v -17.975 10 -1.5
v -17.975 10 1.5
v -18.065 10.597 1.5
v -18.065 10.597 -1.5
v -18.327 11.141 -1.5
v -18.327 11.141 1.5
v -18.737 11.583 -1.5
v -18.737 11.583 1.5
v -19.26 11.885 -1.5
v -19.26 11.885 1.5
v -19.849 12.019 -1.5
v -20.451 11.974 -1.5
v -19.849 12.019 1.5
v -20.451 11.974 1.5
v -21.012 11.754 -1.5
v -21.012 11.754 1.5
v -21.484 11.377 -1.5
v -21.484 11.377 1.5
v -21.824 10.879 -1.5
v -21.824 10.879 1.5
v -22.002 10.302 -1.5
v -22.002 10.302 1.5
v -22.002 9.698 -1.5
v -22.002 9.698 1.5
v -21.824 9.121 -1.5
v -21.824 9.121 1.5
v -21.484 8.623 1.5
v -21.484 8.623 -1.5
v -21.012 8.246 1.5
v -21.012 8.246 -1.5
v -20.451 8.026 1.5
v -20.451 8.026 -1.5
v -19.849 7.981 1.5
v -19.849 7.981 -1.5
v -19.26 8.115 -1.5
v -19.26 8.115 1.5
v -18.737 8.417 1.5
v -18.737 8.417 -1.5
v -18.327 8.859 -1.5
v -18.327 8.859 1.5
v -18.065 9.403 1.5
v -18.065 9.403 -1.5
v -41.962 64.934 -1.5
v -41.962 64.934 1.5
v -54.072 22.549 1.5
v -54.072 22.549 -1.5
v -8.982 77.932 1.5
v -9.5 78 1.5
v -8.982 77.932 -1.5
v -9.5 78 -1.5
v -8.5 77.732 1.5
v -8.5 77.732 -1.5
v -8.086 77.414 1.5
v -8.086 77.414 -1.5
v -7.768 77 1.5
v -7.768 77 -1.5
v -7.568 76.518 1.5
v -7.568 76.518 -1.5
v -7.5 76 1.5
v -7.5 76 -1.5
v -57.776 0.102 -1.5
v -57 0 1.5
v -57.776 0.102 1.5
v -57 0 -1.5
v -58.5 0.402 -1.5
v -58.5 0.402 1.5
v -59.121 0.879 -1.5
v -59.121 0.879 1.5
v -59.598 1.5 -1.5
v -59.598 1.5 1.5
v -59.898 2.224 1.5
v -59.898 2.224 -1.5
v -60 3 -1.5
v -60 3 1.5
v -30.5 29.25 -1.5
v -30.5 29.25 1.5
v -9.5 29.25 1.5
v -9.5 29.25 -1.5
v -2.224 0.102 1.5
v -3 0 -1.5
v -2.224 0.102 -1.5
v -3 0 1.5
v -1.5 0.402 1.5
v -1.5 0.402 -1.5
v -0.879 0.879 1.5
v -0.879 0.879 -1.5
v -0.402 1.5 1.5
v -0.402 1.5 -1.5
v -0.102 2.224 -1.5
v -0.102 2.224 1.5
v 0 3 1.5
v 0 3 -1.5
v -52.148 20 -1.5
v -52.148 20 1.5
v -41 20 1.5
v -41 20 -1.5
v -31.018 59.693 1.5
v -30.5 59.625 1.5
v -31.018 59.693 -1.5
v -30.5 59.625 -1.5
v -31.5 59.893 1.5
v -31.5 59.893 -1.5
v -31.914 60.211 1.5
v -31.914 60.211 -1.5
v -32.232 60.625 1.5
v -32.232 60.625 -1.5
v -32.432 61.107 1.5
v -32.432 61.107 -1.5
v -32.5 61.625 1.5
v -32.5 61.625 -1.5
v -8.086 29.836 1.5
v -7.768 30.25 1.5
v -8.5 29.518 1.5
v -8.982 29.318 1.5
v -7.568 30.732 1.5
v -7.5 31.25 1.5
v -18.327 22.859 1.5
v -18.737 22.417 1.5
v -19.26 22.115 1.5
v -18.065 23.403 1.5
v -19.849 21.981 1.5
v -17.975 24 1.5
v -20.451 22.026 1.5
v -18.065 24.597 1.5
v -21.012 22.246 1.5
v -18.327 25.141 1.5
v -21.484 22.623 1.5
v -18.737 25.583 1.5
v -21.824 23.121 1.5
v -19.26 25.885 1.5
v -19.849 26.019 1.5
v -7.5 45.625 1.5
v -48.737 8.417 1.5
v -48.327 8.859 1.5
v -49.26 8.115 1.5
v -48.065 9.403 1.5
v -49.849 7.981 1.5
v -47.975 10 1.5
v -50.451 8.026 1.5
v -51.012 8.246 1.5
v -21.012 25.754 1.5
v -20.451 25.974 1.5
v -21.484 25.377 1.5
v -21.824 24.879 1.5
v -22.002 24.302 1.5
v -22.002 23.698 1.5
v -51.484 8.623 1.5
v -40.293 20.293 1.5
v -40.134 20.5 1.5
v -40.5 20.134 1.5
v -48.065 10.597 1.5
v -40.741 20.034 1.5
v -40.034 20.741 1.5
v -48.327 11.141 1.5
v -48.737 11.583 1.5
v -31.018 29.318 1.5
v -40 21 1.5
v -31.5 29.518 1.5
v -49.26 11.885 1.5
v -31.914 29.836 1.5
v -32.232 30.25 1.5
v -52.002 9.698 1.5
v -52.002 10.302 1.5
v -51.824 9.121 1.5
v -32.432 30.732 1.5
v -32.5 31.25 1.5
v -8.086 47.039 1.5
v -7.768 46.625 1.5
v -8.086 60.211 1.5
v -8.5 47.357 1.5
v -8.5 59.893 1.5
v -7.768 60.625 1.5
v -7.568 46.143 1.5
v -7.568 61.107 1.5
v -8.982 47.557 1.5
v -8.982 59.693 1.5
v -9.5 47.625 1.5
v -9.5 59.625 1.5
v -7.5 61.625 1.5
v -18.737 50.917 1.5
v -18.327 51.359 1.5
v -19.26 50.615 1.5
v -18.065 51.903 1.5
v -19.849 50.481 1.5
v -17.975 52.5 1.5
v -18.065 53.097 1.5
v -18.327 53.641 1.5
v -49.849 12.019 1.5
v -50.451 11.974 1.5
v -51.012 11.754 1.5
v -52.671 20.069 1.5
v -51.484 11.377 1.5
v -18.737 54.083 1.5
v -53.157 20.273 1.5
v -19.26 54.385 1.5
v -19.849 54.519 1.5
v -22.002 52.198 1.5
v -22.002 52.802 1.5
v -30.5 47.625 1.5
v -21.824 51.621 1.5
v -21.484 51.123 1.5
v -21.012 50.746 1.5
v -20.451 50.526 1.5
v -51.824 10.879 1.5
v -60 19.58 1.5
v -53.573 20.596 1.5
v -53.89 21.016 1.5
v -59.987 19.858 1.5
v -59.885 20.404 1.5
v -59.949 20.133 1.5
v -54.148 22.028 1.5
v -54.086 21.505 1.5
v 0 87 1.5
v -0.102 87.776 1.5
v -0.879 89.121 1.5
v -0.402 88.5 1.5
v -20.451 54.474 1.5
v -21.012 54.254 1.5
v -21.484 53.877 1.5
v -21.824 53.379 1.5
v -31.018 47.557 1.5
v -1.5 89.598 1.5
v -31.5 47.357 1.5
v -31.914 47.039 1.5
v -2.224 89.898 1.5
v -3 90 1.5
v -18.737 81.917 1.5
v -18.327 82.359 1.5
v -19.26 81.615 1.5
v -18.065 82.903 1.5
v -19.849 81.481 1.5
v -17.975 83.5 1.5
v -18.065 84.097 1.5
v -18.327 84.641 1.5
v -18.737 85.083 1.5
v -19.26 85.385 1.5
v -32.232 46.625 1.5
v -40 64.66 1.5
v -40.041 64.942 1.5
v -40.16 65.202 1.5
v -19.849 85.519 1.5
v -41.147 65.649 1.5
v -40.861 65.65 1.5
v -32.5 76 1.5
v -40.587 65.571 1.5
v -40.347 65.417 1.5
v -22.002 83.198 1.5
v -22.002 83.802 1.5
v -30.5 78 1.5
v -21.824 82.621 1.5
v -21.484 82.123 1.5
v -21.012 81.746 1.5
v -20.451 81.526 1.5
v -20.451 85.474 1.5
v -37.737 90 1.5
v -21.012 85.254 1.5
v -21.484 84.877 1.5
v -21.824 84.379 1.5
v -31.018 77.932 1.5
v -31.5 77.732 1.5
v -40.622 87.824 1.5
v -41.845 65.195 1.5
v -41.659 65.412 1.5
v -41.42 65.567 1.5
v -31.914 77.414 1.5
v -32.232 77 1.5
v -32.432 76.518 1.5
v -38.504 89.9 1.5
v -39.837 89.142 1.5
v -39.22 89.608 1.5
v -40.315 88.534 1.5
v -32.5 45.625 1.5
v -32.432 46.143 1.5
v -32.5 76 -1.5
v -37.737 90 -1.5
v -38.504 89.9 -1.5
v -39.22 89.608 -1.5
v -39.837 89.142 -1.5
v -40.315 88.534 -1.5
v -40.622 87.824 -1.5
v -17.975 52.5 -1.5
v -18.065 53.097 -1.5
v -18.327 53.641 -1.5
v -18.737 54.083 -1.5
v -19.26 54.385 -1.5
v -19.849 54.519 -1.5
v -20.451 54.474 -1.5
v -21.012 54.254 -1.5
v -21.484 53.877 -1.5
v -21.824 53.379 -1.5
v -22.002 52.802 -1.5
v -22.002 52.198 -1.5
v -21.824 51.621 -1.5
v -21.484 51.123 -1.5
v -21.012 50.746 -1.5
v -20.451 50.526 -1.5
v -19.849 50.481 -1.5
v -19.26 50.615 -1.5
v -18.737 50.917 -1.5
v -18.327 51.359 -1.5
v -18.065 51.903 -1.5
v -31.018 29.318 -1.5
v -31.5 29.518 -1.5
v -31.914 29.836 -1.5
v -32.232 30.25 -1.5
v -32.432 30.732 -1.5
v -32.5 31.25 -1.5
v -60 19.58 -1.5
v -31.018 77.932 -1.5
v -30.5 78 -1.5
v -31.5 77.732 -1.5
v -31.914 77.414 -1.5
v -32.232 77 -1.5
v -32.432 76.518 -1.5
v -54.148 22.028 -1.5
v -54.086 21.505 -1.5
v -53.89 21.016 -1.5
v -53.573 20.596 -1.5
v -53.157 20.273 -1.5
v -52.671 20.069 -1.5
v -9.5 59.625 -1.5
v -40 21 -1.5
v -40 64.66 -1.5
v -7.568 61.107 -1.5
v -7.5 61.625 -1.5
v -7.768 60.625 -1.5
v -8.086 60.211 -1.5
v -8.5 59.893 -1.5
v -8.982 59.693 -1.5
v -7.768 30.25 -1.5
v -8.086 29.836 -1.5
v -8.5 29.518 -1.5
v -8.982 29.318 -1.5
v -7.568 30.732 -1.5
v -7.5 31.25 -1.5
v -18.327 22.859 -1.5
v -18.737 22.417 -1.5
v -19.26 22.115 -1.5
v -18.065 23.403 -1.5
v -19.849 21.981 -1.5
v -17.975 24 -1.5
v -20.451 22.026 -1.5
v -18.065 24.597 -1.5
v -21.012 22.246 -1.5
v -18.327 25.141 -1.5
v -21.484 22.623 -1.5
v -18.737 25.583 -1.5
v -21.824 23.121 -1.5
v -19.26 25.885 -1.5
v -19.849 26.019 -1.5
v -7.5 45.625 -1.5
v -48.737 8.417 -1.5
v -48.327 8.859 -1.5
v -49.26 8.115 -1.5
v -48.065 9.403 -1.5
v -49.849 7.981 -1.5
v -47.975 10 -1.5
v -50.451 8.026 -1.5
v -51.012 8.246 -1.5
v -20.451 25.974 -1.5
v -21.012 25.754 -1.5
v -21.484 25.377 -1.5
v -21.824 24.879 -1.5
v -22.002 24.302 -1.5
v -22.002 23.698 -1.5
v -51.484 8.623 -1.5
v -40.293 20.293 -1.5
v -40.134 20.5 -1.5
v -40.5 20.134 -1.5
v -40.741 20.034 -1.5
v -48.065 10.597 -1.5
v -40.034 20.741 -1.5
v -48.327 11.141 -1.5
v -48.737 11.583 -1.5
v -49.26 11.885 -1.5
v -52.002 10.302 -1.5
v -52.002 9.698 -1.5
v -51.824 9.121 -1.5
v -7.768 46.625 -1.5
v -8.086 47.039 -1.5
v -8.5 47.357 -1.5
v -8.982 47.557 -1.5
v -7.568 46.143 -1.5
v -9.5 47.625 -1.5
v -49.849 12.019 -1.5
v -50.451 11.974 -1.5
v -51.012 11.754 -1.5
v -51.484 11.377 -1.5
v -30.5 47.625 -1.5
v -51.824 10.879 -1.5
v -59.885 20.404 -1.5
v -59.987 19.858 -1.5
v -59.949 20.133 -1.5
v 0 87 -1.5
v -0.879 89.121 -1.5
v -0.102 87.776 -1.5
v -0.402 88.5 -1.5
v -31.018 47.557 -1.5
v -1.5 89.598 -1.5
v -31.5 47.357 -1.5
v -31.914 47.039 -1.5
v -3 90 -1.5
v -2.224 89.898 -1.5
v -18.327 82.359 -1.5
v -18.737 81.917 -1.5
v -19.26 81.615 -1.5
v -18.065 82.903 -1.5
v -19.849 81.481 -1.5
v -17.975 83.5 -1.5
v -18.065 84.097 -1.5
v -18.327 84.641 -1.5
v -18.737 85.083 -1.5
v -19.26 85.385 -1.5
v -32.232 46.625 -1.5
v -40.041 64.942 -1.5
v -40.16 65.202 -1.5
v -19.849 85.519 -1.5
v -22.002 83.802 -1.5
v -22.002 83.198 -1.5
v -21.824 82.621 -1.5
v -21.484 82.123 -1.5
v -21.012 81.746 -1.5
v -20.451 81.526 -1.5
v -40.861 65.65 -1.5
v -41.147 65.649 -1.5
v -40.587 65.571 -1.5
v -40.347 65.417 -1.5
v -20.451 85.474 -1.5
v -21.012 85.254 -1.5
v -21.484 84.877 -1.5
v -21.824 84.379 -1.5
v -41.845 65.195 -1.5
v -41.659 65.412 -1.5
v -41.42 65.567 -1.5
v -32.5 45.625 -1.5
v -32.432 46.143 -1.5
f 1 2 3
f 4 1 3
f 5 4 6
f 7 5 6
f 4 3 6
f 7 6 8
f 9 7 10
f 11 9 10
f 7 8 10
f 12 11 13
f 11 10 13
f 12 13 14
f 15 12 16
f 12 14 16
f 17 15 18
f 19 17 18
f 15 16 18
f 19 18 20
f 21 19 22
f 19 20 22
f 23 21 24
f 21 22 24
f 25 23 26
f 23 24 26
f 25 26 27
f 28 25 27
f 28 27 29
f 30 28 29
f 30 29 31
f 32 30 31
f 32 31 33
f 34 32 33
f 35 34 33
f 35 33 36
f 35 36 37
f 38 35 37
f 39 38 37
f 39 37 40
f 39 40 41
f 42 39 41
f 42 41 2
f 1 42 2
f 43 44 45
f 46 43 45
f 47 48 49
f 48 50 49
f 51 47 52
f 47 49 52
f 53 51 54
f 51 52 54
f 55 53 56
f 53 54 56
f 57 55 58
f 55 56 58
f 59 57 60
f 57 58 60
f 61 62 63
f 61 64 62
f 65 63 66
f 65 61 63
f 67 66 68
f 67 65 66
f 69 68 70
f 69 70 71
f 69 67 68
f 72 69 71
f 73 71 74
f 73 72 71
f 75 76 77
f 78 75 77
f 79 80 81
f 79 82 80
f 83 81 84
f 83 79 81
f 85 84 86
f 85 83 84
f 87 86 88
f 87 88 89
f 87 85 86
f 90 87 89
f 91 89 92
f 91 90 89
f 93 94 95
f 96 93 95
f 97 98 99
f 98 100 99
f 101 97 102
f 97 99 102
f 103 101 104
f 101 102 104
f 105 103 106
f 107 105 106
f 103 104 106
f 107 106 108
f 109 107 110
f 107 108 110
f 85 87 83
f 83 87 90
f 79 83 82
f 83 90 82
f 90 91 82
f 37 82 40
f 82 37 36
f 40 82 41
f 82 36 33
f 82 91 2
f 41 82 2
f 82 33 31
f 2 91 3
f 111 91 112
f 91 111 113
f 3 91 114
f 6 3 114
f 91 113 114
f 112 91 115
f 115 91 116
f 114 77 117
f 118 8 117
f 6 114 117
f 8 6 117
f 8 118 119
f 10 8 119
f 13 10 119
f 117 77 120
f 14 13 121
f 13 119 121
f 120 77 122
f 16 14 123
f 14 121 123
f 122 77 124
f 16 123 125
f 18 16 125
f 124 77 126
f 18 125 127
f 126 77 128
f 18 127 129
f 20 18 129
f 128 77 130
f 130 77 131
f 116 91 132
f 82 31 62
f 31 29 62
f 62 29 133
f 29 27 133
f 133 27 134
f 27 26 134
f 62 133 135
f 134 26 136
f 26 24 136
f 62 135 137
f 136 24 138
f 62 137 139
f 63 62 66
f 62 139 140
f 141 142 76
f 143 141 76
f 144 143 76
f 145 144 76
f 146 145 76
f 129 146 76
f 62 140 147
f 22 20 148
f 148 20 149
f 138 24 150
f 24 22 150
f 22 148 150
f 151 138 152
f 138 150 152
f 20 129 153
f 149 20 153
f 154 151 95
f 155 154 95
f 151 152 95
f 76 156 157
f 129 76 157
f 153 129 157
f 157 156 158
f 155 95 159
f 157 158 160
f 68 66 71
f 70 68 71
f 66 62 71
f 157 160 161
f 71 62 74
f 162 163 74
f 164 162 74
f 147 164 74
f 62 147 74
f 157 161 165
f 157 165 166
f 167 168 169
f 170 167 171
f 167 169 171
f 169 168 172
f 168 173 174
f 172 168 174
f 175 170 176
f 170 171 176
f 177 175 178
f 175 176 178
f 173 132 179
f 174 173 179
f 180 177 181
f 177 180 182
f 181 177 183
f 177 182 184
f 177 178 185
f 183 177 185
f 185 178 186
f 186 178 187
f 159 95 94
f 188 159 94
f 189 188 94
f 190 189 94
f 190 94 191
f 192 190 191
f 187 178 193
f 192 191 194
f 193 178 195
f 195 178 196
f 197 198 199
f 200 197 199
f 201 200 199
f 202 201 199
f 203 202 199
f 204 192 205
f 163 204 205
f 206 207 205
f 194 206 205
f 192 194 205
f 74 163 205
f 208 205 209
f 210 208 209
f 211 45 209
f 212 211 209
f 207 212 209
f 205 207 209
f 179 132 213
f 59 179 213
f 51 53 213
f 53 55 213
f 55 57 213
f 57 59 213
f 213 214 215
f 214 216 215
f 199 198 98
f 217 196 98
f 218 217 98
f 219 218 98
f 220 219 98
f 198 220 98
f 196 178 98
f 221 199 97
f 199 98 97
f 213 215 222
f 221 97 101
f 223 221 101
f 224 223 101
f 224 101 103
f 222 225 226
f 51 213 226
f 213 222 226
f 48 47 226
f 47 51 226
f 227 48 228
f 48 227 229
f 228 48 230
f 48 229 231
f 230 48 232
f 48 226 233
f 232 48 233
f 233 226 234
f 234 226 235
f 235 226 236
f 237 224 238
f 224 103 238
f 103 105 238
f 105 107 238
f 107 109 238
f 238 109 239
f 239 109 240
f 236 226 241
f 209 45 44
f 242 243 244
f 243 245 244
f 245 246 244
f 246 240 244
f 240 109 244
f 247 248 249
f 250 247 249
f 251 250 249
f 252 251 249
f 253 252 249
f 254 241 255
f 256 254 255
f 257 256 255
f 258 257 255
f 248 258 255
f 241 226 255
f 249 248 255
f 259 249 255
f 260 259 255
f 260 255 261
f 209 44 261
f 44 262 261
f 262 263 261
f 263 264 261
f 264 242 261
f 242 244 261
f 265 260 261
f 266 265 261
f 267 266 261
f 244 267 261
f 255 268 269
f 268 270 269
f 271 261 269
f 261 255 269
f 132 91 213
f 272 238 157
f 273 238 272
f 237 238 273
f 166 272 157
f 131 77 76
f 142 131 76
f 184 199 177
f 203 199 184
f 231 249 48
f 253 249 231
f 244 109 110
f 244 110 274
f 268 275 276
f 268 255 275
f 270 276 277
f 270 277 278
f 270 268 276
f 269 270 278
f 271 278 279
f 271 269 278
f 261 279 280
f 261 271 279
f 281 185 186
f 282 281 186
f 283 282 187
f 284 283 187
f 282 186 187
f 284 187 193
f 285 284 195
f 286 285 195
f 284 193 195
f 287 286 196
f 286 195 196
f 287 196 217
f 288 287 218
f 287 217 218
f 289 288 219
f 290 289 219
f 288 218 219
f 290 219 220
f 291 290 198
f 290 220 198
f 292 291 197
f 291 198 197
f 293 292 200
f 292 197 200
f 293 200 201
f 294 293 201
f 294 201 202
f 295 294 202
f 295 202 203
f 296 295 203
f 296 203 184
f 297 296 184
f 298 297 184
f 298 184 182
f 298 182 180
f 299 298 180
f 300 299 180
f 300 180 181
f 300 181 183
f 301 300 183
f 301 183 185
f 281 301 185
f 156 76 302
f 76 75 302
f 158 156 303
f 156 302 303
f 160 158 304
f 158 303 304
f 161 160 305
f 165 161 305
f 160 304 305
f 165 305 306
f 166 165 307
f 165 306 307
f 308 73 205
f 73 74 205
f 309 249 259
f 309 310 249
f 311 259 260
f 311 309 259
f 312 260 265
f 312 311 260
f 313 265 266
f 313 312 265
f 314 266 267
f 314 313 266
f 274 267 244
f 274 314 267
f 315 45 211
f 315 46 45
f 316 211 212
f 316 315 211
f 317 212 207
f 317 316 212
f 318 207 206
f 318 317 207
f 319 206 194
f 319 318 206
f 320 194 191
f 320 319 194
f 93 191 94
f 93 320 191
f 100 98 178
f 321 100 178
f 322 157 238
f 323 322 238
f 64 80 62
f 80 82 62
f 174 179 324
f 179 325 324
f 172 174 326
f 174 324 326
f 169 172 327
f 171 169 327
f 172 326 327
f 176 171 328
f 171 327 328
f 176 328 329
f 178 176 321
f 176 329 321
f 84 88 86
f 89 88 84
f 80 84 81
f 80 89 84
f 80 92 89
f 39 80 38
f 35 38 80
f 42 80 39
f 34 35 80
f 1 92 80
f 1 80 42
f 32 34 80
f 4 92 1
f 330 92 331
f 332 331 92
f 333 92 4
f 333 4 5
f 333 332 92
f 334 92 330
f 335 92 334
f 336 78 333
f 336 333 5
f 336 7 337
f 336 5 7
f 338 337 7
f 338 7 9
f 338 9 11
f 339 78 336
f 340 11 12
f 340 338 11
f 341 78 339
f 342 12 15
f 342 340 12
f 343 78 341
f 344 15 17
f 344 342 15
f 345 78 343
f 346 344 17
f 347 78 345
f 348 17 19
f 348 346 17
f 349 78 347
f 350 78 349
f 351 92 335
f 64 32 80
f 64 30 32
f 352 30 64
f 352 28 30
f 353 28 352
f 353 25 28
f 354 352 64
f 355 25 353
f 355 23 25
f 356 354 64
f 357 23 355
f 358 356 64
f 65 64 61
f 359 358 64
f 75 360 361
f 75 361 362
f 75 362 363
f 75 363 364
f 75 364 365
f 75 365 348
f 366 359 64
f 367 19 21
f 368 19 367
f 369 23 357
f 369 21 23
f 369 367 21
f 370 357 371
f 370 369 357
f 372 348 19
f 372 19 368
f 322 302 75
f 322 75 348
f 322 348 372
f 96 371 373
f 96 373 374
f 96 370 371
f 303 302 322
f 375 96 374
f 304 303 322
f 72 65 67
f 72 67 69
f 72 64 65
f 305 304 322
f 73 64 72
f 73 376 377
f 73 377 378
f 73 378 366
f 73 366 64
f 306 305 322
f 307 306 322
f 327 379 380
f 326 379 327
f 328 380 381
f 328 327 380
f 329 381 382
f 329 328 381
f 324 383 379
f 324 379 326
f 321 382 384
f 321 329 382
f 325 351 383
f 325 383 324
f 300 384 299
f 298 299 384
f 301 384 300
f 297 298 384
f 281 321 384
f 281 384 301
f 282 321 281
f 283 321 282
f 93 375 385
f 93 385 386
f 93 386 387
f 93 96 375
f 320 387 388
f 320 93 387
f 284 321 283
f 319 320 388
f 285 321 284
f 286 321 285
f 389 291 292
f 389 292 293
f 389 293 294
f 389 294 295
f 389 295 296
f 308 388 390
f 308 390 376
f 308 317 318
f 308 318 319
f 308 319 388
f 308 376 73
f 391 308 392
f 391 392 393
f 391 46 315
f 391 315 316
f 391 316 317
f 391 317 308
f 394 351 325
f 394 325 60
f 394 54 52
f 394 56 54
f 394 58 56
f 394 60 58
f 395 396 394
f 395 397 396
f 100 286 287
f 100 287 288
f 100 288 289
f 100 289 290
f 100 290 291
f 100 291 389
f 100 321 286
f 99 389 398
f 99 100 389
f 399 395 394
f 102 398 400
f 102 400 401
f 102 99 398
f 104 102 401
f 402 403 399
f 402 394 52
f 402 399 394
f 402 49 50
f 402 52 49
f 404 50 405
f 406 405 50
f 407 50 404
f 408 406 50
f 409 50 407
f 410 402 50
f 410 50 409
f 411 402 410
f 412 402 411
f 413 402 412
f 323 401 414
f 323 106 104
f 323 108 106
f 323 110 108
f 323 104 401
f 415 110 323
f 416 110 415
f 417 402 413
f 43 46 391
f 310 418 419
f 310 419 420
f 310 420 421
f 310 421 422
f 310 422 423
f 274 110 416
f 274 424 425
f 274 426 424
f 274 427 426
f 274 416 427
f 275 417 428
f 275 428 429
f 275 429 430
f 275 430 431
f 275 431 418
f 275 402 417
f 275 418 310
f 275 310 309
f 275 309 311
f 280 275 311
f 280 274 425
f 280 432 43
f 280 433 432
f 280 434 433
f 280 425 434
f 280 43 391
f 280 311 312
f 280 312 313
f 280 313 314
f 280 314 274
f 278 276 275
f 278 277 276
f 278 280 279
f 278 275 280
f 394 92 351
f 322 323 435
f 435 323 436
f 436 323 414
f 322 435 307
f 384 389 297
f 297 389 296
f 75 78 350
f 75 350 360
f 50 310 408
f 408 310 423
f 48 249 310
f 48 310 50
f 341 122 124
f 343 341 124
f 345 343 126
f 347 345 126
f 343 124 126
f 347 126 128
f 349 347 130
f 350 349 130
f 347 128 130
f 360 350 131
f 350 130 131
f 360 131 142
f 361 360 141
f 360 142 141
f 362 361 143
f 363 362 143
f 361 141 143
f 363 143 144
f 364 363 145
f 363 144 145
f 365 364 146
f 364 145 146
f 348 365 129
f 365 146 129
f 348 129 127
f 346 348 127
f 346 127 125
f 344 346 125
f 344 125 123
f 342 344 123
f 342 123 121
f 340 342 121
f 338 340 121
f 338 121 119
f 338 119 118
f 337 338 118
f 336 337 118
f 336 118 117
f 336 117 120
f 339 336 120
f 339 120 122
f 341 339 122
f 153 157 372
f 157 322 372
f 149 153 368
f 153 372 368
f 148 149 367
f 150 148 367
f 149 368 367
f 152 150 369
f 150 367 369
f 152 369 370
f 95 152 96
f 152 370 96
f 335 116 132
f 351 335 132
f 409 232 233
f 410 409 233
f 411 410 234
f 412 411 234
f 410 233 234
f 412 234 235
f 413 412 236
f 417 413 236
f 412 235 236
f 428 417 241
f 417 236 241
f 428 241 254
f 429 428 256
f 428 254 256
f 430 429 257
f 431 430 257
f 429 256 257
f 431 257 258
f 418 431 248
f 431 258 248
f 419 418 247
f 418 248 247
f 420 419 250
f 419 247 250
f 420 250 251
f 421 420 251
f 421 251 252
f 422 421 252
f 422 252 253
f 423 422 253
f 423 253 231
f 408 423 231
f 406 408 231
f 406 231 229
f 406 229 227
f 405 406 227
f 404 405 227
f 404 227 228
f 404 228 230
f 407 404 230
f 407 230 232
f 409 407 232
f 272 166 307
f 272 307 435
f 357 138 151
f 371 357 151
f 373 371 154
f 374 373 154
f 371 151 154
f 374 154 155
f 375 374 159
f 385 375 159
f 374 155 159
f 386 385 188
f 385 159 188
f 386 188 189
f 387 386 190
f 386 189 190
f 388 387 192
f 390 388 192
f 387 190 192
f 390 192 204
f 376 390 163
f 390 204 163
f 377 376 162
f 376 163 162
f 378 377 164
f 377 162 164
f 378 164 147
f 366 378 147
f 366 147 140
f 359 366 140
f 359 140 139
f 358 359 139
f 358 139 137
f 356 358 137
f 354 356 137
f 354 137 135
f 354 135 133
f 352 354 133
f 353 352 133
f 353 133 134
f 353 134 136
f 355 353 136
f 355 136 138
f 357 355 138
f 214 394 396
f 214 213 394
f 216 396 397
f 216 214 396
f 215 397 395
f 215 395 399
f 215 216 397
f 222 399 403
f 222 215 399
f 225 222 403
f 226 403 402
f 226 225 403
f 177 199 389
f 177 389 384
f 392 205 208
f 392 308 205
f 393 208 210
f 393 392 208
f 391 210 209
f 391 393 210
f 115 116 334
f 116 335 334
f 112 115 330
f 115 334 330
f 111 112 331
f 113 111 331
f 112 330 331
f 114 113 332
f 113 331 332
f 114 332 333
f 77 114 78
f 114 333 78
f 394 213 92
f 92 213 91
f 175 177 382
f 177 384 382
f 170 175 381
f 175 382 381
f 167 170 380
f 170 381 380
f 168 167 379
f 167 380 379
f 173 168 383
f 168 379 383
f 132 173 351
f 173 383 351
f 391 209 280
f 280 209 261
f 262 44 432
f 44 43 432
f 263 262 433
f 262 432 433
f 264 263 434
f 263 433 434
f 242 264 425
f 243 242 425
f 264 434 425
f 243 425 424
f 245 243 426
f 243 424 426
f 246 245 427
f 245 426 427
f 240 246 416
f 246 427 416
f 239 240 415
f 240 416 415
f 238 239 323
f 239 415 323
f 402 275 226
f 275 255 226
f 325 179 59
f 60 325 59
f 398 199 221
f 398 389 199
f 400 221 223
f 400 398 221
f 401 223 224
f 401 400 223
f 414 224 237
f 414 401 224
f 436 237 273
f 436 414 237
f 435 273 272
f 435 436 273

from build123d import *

# Parameters (mm, degrees)
EXTRUDE_1_DEPTH     = 1.5
CUT_EXTRUDE_1_DEPTH = 4
FILLET_1_R          = 1
SKETCH_3_W          = 25
SKETCH_3_H          = 18.375
CUT_EXTRUDE_2_DEPTH = 4
FILLET_2_R          = 2
SKETCH_4_R          = 2.025
CUT_EXTRUDE_3_DEPTH = 10
FILLET_3_R          = 3
FILLET_4_R          = 2


with BuildPart() as part:
    # 草图1 → 凸台-拉伸1 (new body, symmetric)
    with BuildSketch(Plane.XY):
        Polygon((0, 0), (-60, 0), (-60, 20), (-40, 90), (0, 90), align=None)
    extrude(amount=EXTRUDE_1_DEPTH, both=True)

    # 草图2 → 切除-拉伸1 (cut, through all)
    with BuildSketch(Plane.XY.offset(1.5)):
        Polygon((-40, 71.799725277), (-54.799921508, 20), (-40, 20), align=None)
    extrude(amount=-CUT_EXTRUDE_1_DEPTH, mode=Mode.SUBTRACT)

    # 圆角1
    fillet_1_edges = [part.edges().sort_by_distance(p)[0] for p in [
        (-40, 71.799725277, 0),
        (-40, 20, 0),
    ]]
    fillet(fillet_1_edges, radius=FILLET_1_R)

    # 草图3 → 切除-拉伸2 (cut, through all)
    with BuildSketch(Plane.XY.offset(1.5)):
        with Locations((-20, 68.8125)):
            Rectangle(SKETCH_3_W, SKETCH_3_H)
        with Locations((-20, 38.4375)):
            Rectangle(SKETCH_3_W, SKETCH_3_H)
    extrude(amount=-CUT_EXTRUDE_2_DEPTH, mode=Mode.SUBTRACT)

    # 圆角2
    fillet_2_edges = [part.edges().sort_by_distance(p)[0] for p in [
        (-7.5, 78, 0),
        (-7.5, 59.625, 0),
        (-32.5, 59.625, 0),
        (-32.5, 78, 0),
        (-7.5, 47.625, 0),
        (-7.5, 29.25, 0),
        (-32.5, 29.25, 0),
        (-32.5, 47.625, 0),
    ]]
    fillet(fillet_2_edges, radius=FILLET_2_R)

    # 草图4 → 切除-拉伸3 (cut)
    with BuildSketch(Plane.XY.offset(1.5)):
        with Locations((-50, 10)):
            Circle(SKETCH_4_R)
        with Locations((-20, 10)):
            Circle(SKETCH_4_R)
        with Locations((-20, 24)):
            Circle(SKETCH_4_R)
        with Locations((-20, 52.5)):
            Circle(SKETCH_4_R)
        with Locations((-20, 83.5)):
            Circle(SKETCH_4_R)
    extrude(amount=-CUT_EXTRUDE_3_DEPTH, mode=Mode.SUBTRACT)

    # 圆角3
    fillet_3_edges = [part.edges().sort_by_distance(p)[0] for p in [
        (0, 0, 0),
        (-60, 0, 0),
        (-60, 20, 0),
        (-40, 90, 0),
        (0, 90, 0),
    ]]
    fillet(fillet_3_edges, radius=FILLET_3_R)

    # 圆角4
    fillet_4_edges = [part.edges().sort_by_distance(p)[0] for p in [
        (-54.799921508, 20, 0),
    ]]
    fillet(fillet_4_edges, radius=FILLET_4_R)


solid = part.part
